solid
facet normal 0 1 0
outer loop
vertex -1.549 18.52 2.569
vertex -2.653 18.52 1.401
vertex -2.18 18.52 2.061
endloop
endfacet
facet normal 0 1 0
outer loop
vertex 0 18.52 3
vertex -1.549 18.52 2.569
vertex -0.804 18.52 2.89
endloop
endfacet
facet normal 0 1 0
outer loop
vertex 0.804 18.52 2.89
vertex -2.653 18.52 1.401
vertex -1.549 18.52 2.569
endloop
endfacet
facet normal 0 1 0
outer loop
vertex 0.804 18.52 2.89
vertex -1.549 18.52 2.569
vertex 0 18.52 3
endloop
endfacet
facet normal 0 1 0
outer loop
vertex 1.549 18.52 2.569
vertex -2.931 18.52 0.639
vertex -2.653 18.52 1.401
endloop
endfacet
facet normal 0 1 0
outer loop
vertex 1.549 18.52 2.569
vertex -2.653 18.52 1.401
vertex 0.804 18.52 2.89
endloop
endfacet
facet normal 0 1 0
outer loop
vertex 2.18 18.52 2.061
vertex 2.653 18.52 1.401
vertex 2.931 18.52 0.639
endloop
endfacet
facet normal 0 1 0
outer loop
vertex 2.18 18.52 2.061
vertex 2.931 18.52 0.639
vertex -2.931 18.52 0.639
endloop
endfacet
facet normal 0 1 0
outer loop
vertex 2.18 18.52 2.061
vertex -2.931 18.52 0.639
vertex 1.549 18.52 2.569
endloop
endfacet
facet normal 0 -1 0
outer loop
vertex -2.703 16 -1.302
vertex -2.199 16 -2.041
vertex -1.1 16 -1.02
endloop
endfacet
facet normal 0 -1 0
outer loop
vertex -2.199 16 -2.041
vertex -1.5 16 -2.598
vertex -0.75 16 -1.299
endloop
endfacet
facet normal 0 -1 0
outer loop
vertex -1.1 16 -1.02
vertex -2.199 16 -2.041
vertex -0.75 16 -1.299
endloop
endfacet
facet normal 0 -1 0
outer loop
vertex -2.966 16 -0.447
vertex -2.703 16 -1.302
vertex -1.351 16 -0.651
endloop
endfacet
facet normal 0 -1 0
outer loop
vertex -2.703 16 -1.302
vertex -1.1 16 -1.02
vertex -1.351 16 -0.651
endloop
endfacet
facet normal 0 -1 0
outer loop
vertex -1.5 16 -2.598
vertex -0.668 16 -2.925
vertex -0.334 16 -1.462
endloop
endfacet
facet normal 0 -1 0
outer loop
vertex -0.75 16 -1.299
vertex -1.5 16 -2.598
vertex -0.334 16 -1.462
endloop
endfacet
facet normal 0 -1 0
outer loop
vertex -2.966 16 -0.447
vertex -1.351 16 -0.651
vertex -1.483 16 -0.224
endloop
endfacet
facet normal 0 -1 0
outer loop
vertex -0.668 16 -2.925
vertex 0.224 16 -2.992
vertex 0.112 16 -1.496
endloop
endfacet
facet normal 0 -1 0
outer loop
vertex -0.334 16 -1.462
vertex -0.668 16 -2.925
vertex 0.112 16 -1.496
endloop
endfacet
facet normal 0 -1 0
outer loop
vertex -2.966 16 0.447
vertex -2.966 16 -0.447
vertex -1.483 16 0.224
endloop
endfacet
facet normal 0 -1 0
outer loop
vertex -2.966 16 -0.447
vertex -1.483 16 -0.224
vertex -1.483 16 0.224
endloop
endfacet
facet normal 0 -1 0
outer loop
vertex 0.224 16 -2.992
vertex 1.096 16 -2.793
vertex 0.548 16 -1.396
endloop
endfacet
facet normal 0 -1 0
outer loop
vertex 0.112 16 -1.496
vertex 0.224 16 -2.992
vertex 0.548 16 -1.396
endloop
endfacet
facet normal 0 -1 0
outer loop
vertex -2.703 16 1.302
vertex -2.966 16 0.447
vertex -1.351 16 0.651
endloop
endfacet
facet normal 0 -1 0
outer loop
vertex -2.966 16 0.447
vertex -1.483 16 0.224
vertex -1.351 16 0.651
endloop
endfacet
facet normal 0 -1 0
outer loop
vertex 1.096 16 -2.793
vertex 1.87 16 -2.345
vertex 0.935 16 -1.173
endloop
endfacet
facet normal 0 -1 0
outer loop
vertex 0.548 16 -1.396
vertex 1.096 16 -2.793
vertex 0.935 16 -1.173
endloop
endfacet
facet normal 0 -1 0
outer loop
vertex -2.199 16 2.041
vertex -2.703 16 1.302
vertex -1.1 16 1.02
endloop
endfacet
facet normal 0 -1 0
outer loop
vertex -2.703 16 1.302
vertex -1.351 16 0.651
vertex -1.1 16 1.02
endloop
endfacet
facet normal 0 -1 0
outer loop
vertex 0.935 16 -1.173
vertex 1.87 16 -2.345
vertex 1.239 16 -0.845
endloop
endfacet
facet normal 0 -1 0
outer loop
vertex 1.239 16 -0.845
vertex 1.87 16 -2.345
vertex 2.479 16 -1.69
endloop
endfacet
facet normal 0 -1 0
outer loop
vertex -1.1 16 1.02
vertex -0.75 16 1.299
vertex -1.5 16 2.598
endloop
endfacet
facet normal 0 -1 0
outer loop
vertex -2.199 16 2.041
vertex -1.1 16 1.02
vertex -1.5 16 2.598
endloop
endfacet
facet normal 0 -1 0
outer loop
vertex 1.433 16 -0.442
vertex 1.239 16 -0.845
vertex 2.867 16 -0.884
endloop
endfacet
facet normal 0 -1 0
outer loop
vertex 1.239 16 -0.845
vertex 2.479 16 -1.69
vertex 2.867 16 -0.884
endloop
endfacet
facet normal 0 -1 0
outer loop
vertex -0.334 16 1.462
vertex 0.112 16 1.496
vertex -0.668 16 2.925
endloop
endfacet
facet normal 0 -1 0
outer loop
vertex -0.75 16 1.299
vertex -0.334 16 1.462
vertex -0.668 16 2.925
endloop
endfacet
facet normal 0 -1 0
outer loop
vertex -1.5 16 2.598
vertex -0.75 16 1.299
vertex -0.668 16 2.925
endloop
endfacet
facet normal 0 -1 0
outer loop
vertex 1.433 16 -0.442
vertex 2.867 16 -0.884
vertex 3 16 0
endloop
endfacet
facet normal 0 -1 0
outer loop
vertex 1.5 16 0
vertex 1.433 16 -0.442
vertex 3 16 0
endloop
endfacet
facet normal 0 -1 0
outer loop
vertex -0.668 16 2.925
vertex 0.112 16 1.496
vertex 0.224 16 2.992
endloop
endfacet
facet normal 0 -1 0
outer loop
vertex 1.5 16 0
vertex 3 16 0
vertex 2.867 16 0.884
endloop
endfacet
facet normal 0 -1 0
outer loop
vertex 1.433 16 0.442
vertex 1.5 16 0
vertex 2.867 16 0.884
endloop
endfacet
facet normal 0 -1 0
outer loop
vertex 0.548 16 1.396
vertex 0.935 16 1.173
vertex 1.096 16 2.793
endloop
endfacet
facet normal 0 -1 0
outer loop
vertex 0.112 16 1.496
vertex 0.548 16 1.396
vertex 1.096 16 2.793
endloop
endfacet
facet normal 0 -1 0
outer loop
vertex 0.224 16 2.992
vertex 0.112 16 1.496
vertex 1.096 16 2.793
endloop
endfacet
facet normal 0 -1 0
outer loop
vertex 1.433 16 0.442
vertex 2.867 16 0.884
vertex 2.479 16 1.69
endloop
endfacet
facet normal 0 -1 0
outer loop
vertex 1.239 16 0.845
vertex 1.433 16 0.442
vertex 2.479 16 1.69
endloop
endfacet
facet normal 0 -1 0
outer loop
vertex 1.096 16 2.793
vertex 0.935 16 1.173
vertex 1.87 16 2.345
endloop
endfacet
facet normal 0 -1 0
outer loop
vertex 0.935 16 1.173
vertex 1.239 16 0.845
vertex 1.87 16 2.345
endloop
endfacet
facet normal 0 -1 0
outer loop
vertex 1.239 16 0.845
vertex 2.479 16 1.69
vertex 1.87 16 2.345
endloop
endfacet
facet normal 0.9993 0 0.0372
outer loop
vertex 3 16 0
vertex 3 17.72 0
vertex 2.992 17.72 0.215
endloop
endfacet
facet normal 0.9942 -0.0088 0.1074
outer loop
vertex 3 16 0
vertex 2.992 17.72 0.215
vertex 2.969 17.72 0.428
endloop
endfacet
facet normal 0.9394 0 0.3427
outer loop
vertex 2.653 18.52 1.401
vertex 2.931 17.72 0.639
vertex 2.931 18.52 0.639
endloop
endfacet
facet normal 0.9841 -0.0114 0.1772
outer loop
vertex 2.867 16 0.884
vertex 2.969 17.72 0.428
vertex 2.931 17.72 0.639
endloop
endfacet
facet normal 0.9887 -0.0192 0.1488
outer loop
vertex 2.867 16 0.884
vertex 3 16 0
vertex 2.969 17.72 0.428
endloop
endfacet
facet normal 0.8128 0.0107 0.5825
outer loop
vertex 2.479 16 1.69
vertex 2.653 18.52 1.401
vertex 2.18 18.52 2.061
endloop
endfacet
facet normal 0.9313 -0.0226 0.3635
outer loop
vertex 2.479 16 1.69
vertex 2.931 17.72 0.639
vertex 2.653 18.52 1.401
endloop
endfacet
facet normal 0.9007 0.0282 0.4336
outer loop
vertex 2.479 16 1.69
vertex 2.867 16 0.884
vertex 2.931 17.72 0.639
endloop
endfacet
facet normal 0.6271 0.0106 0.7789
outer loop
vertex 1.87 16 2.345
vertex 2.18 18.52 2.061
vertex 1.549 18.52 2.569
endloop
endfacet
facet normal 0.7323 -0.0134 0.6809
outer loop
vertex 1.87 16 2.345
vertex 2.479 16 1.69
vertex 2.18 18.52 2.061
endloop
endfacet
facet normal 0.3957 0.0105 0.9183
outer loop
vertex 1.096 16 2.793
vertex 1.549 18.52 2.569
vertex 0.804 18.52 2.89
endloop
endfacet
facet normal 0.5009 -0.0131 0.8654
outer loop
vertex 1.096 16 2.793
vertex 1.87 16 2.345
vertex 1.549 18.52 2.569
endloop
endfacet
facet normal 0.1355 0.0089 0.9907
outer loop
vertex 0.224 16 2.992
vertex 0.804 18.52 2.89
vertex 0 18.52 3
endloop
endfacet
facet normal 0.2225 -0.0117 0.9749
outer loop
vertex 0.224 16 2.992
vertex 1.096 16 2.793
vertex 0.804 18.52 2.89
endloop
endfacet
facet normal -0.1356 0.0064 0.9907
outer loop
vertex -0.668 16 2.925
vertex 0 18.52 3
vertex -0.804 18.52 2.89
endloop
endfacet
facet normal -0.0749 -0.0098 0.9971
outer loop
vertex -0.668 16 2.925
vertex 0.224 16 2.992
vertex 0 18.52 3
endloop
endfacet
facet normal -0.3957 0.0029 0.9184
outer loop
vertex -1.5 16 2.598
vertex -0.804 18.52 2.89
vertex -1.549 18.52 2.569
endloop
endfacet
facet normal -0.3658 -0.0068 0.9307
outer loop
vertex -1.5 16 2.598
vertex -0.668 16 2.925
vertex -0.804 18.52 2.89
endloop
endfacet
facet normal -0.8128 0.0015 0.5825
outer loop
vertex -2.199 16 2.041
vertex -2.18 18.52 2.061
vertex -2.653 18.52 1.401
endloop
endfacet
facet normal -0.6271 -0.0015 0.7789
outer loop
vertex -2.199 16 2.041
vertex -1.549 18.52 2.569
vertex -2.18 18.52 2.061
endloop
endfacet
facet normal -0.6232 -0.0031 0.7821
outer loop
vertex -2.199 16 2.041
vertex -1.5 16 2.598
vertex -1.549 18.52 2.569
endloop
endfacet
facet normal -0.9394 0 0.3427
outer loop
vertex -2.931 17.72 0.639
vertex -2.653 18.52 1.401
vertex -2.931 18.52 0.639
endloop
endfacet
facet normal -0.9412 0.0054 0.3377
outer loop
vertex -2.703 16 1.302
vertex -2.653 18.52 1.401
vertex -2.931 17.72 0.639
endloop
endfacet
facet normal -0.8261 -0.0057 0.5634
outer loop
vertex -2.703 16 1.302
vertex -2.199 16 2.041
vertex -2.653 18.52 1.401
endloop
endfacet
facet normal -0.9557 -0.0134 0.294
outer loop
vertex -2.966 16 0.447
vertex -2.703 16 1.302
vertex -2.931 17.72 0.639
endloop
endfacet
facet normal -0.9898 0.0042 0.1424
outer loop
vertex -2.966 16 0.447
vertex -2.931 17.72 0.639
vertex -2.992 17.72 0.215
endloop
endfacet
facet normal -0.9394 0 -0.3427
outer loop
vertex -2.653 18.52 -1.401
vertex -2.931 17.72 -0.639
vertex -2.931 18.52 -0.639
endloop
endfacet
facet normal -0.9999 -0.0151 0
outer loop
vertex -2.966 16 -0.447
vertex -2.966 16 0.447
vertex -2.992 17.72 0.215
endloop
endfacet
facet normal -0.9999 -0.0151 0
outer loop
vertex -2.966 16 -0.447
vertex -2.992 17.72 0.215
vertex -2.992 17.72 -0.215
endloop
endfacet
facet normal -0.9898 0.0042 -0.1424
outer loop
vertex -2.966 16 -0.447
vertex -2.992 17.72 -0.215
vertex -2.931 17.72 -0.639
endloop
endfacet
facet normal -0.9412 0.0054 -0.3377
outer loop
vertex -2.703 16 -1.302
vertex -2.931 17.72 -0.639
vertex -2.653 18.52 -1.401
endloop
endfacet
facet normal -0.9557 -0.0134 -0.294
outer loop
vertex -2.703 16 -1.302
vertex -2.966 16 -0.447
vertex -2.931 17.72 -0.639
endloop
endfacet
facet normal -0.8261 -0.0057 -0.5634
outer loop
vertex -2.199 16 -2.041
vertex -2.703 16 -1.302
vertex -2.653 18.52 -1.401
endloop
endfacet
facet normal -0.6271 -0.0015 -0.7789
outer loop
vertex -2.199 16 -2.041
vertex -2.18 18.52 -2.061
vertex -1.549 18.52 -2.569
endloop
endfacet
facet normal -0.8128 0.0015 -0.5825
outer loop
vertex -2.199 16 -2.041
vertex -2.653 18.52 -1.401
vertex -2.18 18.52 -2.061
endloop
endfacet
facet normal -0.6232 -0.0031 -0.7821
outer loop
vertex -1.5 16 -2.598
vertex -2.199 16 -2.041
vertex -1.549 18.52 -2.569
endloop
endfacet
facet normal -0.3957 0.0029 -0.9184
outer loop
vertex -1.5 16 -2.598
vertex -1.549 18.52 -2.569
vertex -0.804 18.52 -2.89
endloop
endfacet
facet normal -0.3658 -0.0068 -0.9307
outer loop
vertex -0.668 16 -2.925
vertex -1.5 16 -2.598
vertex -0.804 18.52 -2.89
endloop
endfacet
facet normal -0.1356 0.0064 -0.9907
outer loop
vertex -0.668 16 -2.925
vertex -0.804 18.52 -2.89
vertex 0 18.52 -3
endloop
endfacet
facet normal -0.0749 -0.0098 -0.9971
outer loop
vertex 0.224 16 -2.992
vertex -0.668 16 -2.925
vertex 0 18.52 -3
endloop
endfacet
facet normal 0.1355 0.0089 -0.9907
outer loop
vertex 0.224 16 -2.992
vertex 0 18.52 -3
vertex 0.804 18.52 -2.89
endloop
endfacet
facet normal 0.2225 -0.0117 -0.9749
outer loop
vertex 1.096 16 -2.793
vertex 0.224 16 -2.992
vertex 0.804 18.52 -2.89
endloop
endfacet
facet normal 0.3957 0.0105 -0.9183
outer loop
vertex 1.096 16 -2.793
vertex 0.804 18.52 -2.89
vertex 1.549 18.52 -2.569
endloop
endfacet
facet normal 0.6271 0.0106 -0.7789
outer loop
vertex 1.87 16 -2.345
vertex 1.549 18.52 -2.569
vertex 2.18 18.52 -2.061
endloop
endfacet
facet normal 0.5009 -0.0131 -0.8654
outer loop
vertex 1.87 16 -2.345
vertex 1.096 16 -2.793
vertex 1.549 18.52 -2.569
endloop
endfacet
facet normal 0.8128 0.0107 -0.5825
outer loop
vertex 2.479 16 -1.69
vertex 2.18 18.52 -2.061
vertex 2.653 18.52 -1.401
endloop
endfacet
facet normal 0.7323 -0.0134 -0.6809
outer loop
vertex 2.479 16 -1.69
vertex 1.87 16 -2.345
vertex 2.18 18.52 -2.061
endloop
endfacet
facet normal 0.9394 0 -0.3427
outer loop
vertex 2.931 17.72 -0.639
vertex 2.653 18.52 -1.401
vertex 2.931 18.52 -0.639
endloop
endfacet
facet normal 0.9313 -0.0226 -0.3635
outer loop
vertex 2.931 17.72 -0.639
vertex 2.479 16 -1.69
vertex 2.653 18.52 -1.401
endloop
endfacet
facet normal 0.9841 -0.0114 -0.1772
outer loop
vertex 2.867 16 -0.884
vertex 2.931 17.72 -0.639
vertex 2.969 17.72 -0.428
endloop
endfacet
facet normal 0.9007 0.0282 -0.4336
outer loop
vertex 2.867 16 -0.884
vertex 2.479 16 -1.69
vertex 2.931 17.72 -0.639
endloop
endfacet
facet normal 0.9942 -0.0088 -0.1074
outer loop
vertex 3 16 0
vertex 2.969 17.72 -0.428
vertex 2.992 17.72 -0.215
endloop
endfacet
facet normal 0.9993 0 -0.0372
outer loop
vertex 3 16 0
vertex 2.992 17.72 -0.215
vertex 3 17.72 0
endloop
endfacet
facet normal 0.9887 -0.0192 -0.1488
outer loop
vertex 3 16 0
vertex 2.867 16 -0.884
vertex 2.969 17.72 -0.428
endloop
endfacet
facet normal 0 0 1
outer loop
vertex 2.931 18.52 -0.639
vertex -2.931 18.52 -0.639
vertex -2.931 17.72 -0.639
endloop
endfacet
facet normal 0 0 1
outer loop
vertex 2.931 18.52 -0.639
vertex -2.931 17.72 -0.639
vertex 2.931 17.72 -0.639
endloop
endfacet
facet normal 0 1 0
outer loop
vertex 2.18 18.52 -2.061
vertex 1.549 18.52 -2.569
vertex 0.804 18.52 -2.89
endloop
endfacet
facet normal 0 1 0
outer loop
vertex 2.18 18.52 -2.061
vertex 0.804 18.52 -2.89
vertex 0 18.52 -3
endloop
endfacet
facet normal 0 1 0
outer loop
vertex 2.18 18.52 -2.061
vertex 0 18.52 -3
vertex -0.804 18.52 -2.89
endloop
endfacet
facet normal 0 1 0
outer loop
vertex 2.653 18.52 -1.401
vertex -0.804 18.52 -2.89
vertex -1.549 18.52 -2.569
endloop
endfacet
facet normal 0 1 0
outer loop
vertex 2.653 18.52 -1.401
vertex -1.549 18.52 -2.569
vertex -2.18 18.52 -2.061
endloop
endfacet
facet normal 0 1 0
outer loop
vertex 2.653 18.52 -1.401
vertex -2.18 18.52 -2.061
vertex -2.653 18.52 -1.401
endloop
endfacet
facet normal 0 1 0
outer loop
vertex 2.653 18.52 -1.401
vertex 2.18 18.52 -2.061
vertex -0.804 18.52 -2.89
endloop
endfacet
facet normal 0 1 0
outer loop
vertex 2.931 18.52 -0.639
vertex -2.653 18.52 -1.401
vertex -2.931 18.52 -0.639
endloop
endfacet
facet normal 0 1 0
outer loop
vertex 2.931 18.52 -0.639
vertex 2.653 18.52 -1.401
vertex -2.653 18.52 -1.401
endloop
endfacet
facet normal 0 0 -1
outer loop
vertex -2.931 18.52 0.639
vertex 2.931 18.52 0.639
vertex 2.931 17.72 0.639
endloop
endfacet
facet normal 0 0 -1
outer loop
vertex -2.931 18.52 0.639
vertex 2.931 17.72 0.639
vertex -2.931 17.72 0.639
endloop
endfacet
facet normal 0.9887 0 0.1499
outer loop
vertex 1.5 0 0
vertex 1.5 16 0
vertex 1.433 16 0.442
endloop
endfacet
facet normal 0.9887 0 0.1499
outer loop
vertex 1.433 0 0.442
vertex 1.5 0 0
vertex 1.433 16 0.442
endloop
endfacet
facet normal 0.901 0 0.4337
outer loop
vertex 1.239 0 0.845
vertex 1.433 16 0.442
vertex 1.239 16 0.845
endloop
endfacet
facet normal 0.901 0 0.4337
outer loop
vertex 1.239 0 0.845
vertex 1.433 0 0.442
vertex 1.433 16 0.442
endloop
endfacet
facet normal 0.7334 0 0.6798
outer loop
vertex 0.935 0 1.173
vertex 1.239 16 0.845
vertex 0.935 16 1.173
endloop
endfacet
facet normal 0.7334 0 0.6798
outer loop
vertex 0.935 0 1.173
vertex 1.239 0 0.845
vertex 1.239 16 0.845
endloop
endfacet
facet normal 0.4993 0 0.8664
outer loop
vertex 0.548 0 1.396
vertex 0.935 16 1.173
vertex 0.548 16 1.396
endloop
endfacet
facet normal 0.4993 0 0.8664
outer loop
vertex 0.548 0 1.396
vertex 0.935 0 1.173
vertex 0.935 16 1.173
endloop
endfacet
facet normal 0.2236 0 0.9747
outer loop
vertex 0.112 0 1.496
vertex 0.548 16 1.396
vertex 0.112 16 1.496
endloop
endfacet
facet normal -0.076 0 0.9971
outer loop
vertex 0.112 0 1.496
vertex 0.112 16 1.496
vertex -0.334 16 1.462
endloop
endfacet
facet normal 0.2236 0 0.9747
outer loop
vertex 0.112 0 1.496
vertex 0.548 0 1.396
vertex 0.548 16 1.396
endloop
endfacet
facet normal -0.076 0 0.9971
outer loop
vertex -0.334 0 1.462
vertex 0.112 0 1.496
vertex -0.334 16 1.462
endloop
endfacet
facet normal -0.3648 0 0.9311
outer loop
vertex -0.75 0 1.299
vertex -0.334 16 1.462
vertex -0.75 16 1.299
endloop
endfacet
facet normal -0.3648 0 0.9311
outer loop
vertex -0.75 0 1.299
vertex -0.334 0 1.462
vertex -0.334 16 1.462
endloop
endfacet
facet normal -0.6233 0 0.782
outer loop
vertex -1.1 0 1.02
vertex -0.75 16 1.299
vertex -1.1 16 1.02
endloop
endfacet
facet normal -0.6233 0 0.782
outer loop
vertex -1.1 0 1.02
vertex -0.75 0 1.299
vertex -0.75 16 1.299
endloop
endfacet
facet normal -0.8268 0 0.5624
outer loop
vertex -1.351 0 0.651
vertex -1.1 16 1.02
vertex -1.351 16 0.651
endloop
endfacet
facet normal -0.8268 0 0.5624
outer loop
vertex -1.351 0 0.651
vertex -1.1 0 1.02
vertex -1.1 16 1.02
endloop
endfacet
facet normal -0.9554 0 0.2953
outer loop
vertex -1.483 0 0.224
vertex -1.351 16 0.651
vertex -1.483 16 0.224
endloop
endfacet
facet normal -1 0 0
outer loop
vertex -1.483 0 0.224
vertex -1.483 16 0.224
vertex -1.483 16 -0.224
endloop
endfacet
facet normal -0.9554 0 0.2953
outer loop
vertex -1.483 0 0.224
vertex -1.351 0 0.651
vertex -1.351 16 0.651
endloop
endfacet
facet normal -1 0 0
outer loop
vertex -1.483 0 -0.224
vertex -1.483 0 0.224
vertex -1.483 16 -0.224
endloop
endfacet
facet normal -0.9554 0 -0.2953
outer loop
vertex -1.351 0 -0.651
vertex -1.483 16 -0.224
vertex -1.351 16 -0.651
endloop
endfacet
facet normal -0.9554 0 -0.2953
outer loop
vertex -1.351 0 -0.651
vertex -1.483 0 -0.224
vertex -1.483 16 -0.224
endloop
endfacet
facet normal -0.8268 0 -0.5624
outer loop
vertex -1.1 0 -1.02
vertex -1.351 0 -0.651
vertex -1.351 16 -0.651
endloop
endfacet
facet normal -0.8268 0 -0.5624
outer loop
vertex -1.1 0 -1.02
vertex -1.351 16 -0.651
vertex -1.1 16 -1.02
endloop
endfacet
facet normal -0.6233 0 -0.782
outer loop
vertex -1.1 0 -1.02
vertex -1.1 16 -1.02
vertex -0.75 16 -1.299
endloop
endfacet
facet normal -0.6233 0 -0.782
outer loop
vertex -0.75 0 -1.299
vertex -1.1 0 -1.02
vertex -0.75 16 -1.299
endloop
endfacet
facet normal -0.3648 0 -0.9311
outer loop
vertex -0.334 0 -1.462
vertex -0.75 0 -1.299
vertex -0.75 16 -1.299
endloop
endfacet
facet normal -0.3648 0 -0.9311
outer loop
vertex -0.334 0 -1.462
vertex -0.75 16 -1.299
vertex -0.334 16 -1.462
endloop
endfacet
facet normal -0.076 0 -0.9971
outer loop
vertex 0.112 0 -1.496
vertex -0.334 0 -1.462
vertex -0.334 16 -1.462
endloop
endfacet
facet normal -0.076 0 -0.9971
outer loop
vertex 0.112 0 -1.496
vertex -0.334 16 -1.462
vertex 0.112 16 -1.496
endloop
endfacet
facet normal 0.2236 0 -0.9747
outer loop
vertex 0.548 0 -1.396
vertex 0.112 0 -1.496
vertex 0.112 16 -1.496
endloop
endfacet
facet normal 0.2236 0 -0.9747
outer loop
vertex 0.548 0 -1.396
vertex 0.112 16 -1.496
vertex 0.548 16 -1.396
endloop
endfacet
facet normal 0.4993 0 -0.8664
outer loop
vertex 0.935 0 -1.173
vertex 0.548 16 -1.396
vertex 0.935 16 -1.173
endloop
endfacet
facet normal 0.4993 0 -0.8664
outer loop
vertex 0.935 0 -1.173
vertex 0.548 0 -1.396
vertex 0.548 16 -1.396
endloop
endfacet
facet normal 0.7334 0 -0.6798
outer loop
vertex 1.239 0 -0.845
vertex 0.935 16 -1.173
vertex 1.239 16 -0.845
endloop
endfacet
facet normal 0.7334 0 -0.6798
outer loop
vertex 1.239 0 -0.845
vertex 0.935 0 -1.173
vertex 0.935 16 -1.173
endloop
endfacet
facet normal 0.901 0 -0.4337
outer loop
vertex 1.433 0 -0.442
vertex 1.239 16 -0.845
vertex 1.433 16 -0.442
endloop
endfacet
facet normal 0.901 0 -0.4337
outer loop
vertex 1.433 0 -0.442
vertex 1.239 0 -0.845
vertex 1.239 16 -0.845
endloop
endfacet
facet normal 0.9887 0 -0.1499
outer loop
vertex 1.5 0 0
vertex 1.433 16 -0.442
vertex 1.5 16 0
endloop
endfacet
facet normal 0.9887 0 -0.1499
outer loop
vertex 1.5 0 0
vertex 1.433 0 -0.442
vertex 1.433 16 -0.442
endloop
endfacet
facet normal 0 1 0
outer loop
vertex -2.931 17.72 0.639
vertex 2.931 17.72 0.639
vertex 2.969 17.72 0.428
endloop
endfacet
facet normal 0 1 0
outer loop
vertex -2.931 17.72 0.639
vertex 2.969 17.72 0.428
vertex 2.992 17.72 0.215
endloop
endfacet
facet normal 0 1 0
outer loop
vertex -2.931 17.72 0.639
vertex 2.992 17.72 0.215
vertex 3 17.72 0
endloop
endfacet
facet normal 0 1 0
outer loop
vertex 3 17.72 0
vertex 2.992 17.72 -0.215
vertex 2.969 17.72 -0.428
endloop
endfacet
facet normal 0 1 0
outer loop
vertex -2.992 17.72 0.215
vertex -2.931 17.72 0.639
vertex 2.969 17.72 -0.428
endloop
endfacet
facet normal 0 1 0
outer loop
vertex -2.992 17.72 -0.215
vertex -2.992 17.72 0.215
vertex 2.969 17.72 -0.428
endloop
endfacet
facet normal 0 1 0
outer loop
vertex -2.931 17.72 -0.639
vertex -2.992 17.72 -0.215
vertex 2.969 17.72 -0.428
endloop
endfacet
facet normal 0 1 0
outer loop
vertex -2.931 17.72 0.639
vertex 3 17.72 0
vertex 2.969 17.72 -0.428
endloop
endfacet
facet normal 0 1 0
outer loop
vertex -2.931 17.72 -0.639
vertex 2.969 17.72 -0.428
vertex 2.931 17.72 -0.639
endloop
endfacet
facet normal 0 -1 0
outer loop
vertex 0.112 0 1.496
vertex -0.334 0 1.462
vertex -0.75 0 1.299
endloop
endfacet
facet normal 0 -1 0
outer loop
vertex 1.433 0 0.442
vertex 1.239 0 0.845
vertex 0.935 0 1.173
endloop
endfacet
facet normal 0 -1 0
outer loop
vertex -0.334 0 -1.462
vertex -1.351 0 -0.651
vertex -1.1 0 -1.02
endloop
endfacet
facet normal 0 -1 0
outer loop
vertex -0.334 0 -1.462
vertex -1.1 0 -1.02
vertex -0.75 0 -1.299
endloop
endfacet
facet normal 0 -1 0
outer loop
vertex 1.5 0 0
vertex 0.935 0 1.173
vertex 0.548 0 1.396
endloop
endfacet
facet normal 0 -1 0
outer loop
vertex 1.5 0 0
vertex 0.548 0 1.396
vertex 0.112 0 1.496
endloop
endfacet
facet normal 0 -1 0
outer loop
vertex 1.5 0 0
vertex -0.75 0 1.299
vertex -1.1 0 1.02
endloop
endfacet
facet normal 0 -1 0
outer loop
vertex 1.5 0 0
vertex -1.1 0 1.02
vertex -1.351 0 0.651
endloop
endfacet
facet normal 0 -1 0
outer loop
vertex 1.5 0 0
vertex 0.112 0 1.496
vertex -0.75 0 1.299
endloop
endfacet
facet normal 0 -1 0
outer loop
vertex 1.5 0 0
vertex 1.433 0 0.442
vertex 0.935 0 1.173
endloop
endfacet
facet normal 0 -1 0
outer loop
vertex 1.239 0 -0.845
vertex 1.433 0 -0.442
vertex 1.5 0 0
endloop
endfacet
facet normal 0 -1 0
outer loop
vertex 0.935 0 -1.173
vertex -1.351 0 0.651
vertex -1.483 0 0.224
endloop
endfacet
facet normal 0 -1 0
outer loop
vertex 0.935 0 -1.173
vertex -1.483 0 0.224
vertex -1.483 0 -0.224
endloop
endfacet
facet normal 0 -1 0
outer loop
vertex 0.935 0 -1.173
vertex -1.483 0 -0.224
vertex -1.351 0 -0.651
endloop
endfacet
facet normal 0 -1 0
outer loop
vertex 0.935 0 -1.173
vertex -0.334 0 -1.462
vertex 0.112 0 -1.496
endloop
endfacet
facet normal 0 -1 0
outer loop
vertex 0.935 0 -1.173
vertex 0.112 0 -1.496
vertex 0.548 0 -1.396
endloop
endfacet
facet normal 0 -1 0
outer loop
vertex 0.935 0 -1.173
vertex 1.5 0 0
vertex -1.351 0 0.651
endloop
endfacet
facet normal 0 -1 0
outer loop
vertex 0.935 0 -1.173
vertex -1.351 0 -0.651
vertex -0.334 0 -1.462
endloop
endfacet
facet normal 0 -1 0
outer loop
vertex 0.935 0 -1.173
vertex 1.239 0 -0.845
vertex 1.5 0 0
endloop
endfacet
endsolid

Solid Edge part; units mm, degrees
sketch "Sketch1" plane through (0, 0, 0) normal (0, -1, 0) x (1, 0, 0)
  circle A0 centre (0, 0) radius 1.5
extrude "Protrusion1" add sketch "Sketch1" against normal blind 16
sketch "Sketch2" plane through (0, 16, 0) normal (0, 1, 0) x (1, 0, 0)
  circle A0 centre (0, 0) radius 3
extrude "ExtrudedProtrusion_2" add sketch "Sketch2" along normal blind 2.52
sketch "Sketch3" plane through (0, 18.52, 0) normal (0, 1, 0) x (-1, 0, 0)
  line L0 (-2.9311, 0.6393) -> (2.9311, 0.6393)
  arc A0 (2.9311, 0.6393) -> (2.9311, -0.6393) centre (0, 0) cw
  line L1 (2.9311, -0.6393) -> (-2.9311, -0.6393)
  arc A1 (-2.9311, -0.6393) -> (-2.9311, 0.6393) centre (0, 0) cw
extrude "ExtrudedCutout_1" cut sketch "Sketch3" against normal blind 0.8
cosmetic_thread "Thread1" size "M3"
properties material "Nylon, general purpose"
